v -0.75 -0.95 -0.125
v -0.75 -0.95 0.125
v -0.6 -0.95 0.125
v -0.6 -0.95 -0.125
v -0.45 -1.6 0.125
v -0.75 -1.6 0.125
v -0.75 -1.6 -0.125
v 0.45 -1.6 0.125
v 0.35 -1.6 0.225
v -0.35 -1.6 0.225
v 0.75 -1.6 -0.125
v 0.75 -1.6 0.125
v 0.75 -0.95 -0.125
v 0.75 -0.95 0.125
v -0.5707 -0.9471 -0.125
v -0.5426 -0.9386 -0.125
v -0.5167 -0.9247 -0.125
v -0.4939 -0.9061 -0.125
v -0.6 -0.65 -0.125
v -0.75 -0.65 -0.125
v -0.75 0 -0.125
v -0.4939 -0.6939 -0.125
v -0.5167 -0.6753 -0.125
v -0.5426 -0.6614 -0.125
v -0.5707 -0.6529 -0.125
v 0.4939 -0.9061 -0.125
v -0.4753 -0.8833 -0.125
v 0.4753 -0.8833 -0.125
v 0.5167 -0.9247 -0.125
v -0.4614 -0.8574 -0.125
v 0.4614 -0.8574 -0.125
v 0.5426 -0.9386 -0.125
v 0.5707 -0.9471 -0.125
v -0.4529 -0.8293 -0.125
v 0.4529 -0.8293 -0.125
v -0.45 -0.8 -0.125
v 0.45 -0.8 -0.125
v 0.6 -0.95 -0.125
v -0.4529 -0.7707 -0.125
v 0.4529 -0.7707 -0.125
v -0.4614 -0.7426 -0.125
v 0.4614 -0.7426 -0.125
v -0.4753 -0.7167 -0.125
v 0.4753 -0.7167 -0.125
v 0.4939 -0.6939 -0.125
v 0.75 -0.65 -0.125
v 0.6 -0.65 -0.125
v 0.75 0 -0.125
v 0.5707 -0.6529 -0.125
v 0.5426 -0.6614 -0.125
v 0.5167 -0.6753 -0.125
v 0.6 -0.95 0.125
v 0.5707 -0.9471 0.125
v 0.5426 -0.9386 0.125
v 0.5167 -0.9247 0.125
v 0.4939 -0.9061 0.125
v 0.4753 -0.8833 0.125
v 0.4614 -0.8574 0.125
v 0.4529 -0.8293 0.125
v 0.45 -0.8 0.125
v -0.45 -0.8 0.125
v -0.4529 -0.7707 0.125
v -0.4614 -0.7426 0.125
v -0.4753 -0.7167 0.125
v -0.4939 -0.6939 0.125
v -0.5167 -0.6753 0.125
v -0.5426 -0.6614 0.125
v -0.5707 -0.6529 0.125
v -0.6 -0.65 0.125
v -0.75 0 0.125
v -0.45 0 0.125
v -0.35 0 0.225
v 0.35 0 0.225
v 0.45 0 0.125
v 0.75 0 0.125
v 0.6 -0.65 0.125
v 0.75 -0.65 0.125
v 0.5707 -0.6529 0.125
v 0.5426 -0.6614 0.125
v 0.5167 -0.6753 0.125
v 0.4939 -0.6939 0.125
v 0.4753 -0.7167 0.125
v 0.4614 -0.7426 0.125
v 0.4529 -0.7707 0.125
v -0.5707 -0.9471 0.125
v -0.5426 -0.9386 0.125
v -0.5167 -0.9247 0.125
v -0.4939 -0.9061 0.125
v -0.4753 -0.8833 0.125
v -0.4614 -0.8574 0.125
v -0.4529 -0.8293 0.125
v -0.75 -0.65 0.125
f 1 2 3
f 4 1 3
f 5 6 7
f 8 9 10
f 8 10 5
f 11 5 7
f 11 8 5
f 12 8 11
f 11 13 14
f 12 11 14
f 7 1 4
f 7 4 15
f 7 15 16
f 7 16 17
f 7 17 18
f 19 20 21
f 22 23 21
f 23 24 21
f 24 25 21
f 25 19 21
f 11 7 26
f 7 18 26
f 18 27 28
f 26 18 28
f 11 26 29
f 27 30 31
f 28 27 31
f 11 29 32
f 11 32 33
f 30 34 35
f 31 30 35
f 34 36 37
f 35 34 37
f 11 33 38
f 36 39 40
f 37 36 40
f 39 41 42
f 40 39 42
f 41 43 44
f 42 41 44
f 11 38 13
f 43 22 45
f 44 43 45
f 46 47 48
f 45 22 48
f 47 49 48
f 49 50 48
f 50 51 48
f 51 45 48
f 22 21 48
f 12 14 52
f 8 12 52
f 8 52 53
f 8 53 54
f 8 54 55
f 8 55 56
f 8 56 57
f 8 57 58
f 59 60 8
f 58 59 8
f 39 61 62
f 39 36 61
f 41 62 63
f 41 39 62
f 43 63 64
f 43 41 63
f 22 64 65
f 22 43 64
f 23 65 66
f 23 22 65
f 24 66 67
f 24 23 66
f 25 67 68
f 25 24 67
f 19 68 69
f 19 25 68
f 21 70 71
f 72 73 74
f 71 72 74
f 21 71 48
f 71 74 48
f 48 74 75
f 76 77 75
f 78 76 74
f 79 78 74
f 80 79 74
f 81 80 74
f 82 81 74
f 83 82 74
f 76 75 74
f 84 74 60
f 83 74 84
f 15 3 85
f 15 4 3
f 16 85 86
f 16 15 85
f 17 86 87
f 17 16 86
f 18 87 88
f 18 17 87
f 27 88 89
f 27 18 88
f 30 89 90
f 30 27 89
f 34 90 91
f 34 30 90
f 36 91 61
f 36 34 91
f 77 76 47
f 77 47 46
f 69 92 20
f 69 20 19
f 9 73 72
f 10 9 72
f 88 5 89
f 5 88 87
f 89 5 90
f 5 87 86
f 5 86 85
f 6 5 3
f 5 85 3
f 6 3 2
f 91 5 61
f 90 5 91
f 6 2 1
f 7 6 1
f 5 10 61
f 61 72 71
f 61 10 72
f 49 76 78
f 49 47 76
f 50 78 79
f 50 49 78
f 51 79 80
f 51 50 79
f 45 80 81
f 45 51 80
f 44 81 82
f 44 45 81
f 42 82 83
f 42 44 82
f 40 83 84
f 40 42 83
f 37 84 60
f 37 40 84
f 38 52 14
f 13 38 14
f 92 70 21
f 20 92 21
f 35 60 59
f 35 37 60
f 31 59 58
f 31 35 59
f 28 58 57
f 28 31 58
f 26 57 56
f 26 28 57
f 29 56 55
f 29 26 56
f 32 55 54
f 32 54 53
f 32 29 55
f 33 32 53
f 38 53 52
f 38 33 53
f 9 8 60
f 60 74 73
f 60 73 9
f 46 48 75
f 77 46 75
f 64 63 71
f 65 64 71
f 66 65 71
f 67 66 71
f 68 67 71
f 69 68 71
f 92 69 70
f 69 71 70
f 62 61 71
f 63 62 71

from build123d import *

# Parameters (mm, degrees)
F1_DEPTH = 1.6
F2_W     = 0.3
F2_H     = 0.3
F3_DEPTH = 0.3
F4_W     = 0.3
F4_H     = 0.3
F5_DEPTH = 0.3
F6_R     = 0.14999


# Not quite as in the source:
# - a fillet or chamfer is up to 0.001 mm smaller than in the source, because OpenCascade refuses the exact size


with BuildPart() as f1:
    # F0 (on Front) → F1 (new body)
    with BuildSketch(Plane.XZ):
        Polygon((0.75, -0.125), (0.75, 0.125), (0.45, 0.125), (0.35, 0.225), (-0.35, 0.225), (-0.45, 0.125), (-0.75, 0.125), (-0.75, -0.125), align=None)
    extrude(amount=F1_DEPTH)

    # F2 (on face) → F3 (cut)
    with BuildSketch(Plane.XY.offset(0.125)):
        with Locations((-0.6, -0.8)):
            Rectangle(F2_W, F2_H)
    extrude(amount=-F3_DEPTH, mode=Mode.SUBTRACT)

    # F4 (on face) → F5 (cut)
    with BuildSketch(Plane.XY.offset(0.125)):
        with Locations((0.6, -0.8)):
            Rectangle(F4_W, F4_H)
    extrude(amount=-F5_DEPTH, mode=Mode.SUBTRACT)

    # F6 (radius 0.15 in the source; OpenCascade refuses exactly that, so slightly less here)
    f6_edges = [f1.edges().sort_by_distance(p)[0] for p in [
        (0.45, -0.65, 0),
        (-0.45, -0.65, 0),
        (-0.45, -0.95, 0),
        (0.45, -0.95, 0),
    ]]
    fillet(f6_edges, radius=F6_R)


solid = f1.part
